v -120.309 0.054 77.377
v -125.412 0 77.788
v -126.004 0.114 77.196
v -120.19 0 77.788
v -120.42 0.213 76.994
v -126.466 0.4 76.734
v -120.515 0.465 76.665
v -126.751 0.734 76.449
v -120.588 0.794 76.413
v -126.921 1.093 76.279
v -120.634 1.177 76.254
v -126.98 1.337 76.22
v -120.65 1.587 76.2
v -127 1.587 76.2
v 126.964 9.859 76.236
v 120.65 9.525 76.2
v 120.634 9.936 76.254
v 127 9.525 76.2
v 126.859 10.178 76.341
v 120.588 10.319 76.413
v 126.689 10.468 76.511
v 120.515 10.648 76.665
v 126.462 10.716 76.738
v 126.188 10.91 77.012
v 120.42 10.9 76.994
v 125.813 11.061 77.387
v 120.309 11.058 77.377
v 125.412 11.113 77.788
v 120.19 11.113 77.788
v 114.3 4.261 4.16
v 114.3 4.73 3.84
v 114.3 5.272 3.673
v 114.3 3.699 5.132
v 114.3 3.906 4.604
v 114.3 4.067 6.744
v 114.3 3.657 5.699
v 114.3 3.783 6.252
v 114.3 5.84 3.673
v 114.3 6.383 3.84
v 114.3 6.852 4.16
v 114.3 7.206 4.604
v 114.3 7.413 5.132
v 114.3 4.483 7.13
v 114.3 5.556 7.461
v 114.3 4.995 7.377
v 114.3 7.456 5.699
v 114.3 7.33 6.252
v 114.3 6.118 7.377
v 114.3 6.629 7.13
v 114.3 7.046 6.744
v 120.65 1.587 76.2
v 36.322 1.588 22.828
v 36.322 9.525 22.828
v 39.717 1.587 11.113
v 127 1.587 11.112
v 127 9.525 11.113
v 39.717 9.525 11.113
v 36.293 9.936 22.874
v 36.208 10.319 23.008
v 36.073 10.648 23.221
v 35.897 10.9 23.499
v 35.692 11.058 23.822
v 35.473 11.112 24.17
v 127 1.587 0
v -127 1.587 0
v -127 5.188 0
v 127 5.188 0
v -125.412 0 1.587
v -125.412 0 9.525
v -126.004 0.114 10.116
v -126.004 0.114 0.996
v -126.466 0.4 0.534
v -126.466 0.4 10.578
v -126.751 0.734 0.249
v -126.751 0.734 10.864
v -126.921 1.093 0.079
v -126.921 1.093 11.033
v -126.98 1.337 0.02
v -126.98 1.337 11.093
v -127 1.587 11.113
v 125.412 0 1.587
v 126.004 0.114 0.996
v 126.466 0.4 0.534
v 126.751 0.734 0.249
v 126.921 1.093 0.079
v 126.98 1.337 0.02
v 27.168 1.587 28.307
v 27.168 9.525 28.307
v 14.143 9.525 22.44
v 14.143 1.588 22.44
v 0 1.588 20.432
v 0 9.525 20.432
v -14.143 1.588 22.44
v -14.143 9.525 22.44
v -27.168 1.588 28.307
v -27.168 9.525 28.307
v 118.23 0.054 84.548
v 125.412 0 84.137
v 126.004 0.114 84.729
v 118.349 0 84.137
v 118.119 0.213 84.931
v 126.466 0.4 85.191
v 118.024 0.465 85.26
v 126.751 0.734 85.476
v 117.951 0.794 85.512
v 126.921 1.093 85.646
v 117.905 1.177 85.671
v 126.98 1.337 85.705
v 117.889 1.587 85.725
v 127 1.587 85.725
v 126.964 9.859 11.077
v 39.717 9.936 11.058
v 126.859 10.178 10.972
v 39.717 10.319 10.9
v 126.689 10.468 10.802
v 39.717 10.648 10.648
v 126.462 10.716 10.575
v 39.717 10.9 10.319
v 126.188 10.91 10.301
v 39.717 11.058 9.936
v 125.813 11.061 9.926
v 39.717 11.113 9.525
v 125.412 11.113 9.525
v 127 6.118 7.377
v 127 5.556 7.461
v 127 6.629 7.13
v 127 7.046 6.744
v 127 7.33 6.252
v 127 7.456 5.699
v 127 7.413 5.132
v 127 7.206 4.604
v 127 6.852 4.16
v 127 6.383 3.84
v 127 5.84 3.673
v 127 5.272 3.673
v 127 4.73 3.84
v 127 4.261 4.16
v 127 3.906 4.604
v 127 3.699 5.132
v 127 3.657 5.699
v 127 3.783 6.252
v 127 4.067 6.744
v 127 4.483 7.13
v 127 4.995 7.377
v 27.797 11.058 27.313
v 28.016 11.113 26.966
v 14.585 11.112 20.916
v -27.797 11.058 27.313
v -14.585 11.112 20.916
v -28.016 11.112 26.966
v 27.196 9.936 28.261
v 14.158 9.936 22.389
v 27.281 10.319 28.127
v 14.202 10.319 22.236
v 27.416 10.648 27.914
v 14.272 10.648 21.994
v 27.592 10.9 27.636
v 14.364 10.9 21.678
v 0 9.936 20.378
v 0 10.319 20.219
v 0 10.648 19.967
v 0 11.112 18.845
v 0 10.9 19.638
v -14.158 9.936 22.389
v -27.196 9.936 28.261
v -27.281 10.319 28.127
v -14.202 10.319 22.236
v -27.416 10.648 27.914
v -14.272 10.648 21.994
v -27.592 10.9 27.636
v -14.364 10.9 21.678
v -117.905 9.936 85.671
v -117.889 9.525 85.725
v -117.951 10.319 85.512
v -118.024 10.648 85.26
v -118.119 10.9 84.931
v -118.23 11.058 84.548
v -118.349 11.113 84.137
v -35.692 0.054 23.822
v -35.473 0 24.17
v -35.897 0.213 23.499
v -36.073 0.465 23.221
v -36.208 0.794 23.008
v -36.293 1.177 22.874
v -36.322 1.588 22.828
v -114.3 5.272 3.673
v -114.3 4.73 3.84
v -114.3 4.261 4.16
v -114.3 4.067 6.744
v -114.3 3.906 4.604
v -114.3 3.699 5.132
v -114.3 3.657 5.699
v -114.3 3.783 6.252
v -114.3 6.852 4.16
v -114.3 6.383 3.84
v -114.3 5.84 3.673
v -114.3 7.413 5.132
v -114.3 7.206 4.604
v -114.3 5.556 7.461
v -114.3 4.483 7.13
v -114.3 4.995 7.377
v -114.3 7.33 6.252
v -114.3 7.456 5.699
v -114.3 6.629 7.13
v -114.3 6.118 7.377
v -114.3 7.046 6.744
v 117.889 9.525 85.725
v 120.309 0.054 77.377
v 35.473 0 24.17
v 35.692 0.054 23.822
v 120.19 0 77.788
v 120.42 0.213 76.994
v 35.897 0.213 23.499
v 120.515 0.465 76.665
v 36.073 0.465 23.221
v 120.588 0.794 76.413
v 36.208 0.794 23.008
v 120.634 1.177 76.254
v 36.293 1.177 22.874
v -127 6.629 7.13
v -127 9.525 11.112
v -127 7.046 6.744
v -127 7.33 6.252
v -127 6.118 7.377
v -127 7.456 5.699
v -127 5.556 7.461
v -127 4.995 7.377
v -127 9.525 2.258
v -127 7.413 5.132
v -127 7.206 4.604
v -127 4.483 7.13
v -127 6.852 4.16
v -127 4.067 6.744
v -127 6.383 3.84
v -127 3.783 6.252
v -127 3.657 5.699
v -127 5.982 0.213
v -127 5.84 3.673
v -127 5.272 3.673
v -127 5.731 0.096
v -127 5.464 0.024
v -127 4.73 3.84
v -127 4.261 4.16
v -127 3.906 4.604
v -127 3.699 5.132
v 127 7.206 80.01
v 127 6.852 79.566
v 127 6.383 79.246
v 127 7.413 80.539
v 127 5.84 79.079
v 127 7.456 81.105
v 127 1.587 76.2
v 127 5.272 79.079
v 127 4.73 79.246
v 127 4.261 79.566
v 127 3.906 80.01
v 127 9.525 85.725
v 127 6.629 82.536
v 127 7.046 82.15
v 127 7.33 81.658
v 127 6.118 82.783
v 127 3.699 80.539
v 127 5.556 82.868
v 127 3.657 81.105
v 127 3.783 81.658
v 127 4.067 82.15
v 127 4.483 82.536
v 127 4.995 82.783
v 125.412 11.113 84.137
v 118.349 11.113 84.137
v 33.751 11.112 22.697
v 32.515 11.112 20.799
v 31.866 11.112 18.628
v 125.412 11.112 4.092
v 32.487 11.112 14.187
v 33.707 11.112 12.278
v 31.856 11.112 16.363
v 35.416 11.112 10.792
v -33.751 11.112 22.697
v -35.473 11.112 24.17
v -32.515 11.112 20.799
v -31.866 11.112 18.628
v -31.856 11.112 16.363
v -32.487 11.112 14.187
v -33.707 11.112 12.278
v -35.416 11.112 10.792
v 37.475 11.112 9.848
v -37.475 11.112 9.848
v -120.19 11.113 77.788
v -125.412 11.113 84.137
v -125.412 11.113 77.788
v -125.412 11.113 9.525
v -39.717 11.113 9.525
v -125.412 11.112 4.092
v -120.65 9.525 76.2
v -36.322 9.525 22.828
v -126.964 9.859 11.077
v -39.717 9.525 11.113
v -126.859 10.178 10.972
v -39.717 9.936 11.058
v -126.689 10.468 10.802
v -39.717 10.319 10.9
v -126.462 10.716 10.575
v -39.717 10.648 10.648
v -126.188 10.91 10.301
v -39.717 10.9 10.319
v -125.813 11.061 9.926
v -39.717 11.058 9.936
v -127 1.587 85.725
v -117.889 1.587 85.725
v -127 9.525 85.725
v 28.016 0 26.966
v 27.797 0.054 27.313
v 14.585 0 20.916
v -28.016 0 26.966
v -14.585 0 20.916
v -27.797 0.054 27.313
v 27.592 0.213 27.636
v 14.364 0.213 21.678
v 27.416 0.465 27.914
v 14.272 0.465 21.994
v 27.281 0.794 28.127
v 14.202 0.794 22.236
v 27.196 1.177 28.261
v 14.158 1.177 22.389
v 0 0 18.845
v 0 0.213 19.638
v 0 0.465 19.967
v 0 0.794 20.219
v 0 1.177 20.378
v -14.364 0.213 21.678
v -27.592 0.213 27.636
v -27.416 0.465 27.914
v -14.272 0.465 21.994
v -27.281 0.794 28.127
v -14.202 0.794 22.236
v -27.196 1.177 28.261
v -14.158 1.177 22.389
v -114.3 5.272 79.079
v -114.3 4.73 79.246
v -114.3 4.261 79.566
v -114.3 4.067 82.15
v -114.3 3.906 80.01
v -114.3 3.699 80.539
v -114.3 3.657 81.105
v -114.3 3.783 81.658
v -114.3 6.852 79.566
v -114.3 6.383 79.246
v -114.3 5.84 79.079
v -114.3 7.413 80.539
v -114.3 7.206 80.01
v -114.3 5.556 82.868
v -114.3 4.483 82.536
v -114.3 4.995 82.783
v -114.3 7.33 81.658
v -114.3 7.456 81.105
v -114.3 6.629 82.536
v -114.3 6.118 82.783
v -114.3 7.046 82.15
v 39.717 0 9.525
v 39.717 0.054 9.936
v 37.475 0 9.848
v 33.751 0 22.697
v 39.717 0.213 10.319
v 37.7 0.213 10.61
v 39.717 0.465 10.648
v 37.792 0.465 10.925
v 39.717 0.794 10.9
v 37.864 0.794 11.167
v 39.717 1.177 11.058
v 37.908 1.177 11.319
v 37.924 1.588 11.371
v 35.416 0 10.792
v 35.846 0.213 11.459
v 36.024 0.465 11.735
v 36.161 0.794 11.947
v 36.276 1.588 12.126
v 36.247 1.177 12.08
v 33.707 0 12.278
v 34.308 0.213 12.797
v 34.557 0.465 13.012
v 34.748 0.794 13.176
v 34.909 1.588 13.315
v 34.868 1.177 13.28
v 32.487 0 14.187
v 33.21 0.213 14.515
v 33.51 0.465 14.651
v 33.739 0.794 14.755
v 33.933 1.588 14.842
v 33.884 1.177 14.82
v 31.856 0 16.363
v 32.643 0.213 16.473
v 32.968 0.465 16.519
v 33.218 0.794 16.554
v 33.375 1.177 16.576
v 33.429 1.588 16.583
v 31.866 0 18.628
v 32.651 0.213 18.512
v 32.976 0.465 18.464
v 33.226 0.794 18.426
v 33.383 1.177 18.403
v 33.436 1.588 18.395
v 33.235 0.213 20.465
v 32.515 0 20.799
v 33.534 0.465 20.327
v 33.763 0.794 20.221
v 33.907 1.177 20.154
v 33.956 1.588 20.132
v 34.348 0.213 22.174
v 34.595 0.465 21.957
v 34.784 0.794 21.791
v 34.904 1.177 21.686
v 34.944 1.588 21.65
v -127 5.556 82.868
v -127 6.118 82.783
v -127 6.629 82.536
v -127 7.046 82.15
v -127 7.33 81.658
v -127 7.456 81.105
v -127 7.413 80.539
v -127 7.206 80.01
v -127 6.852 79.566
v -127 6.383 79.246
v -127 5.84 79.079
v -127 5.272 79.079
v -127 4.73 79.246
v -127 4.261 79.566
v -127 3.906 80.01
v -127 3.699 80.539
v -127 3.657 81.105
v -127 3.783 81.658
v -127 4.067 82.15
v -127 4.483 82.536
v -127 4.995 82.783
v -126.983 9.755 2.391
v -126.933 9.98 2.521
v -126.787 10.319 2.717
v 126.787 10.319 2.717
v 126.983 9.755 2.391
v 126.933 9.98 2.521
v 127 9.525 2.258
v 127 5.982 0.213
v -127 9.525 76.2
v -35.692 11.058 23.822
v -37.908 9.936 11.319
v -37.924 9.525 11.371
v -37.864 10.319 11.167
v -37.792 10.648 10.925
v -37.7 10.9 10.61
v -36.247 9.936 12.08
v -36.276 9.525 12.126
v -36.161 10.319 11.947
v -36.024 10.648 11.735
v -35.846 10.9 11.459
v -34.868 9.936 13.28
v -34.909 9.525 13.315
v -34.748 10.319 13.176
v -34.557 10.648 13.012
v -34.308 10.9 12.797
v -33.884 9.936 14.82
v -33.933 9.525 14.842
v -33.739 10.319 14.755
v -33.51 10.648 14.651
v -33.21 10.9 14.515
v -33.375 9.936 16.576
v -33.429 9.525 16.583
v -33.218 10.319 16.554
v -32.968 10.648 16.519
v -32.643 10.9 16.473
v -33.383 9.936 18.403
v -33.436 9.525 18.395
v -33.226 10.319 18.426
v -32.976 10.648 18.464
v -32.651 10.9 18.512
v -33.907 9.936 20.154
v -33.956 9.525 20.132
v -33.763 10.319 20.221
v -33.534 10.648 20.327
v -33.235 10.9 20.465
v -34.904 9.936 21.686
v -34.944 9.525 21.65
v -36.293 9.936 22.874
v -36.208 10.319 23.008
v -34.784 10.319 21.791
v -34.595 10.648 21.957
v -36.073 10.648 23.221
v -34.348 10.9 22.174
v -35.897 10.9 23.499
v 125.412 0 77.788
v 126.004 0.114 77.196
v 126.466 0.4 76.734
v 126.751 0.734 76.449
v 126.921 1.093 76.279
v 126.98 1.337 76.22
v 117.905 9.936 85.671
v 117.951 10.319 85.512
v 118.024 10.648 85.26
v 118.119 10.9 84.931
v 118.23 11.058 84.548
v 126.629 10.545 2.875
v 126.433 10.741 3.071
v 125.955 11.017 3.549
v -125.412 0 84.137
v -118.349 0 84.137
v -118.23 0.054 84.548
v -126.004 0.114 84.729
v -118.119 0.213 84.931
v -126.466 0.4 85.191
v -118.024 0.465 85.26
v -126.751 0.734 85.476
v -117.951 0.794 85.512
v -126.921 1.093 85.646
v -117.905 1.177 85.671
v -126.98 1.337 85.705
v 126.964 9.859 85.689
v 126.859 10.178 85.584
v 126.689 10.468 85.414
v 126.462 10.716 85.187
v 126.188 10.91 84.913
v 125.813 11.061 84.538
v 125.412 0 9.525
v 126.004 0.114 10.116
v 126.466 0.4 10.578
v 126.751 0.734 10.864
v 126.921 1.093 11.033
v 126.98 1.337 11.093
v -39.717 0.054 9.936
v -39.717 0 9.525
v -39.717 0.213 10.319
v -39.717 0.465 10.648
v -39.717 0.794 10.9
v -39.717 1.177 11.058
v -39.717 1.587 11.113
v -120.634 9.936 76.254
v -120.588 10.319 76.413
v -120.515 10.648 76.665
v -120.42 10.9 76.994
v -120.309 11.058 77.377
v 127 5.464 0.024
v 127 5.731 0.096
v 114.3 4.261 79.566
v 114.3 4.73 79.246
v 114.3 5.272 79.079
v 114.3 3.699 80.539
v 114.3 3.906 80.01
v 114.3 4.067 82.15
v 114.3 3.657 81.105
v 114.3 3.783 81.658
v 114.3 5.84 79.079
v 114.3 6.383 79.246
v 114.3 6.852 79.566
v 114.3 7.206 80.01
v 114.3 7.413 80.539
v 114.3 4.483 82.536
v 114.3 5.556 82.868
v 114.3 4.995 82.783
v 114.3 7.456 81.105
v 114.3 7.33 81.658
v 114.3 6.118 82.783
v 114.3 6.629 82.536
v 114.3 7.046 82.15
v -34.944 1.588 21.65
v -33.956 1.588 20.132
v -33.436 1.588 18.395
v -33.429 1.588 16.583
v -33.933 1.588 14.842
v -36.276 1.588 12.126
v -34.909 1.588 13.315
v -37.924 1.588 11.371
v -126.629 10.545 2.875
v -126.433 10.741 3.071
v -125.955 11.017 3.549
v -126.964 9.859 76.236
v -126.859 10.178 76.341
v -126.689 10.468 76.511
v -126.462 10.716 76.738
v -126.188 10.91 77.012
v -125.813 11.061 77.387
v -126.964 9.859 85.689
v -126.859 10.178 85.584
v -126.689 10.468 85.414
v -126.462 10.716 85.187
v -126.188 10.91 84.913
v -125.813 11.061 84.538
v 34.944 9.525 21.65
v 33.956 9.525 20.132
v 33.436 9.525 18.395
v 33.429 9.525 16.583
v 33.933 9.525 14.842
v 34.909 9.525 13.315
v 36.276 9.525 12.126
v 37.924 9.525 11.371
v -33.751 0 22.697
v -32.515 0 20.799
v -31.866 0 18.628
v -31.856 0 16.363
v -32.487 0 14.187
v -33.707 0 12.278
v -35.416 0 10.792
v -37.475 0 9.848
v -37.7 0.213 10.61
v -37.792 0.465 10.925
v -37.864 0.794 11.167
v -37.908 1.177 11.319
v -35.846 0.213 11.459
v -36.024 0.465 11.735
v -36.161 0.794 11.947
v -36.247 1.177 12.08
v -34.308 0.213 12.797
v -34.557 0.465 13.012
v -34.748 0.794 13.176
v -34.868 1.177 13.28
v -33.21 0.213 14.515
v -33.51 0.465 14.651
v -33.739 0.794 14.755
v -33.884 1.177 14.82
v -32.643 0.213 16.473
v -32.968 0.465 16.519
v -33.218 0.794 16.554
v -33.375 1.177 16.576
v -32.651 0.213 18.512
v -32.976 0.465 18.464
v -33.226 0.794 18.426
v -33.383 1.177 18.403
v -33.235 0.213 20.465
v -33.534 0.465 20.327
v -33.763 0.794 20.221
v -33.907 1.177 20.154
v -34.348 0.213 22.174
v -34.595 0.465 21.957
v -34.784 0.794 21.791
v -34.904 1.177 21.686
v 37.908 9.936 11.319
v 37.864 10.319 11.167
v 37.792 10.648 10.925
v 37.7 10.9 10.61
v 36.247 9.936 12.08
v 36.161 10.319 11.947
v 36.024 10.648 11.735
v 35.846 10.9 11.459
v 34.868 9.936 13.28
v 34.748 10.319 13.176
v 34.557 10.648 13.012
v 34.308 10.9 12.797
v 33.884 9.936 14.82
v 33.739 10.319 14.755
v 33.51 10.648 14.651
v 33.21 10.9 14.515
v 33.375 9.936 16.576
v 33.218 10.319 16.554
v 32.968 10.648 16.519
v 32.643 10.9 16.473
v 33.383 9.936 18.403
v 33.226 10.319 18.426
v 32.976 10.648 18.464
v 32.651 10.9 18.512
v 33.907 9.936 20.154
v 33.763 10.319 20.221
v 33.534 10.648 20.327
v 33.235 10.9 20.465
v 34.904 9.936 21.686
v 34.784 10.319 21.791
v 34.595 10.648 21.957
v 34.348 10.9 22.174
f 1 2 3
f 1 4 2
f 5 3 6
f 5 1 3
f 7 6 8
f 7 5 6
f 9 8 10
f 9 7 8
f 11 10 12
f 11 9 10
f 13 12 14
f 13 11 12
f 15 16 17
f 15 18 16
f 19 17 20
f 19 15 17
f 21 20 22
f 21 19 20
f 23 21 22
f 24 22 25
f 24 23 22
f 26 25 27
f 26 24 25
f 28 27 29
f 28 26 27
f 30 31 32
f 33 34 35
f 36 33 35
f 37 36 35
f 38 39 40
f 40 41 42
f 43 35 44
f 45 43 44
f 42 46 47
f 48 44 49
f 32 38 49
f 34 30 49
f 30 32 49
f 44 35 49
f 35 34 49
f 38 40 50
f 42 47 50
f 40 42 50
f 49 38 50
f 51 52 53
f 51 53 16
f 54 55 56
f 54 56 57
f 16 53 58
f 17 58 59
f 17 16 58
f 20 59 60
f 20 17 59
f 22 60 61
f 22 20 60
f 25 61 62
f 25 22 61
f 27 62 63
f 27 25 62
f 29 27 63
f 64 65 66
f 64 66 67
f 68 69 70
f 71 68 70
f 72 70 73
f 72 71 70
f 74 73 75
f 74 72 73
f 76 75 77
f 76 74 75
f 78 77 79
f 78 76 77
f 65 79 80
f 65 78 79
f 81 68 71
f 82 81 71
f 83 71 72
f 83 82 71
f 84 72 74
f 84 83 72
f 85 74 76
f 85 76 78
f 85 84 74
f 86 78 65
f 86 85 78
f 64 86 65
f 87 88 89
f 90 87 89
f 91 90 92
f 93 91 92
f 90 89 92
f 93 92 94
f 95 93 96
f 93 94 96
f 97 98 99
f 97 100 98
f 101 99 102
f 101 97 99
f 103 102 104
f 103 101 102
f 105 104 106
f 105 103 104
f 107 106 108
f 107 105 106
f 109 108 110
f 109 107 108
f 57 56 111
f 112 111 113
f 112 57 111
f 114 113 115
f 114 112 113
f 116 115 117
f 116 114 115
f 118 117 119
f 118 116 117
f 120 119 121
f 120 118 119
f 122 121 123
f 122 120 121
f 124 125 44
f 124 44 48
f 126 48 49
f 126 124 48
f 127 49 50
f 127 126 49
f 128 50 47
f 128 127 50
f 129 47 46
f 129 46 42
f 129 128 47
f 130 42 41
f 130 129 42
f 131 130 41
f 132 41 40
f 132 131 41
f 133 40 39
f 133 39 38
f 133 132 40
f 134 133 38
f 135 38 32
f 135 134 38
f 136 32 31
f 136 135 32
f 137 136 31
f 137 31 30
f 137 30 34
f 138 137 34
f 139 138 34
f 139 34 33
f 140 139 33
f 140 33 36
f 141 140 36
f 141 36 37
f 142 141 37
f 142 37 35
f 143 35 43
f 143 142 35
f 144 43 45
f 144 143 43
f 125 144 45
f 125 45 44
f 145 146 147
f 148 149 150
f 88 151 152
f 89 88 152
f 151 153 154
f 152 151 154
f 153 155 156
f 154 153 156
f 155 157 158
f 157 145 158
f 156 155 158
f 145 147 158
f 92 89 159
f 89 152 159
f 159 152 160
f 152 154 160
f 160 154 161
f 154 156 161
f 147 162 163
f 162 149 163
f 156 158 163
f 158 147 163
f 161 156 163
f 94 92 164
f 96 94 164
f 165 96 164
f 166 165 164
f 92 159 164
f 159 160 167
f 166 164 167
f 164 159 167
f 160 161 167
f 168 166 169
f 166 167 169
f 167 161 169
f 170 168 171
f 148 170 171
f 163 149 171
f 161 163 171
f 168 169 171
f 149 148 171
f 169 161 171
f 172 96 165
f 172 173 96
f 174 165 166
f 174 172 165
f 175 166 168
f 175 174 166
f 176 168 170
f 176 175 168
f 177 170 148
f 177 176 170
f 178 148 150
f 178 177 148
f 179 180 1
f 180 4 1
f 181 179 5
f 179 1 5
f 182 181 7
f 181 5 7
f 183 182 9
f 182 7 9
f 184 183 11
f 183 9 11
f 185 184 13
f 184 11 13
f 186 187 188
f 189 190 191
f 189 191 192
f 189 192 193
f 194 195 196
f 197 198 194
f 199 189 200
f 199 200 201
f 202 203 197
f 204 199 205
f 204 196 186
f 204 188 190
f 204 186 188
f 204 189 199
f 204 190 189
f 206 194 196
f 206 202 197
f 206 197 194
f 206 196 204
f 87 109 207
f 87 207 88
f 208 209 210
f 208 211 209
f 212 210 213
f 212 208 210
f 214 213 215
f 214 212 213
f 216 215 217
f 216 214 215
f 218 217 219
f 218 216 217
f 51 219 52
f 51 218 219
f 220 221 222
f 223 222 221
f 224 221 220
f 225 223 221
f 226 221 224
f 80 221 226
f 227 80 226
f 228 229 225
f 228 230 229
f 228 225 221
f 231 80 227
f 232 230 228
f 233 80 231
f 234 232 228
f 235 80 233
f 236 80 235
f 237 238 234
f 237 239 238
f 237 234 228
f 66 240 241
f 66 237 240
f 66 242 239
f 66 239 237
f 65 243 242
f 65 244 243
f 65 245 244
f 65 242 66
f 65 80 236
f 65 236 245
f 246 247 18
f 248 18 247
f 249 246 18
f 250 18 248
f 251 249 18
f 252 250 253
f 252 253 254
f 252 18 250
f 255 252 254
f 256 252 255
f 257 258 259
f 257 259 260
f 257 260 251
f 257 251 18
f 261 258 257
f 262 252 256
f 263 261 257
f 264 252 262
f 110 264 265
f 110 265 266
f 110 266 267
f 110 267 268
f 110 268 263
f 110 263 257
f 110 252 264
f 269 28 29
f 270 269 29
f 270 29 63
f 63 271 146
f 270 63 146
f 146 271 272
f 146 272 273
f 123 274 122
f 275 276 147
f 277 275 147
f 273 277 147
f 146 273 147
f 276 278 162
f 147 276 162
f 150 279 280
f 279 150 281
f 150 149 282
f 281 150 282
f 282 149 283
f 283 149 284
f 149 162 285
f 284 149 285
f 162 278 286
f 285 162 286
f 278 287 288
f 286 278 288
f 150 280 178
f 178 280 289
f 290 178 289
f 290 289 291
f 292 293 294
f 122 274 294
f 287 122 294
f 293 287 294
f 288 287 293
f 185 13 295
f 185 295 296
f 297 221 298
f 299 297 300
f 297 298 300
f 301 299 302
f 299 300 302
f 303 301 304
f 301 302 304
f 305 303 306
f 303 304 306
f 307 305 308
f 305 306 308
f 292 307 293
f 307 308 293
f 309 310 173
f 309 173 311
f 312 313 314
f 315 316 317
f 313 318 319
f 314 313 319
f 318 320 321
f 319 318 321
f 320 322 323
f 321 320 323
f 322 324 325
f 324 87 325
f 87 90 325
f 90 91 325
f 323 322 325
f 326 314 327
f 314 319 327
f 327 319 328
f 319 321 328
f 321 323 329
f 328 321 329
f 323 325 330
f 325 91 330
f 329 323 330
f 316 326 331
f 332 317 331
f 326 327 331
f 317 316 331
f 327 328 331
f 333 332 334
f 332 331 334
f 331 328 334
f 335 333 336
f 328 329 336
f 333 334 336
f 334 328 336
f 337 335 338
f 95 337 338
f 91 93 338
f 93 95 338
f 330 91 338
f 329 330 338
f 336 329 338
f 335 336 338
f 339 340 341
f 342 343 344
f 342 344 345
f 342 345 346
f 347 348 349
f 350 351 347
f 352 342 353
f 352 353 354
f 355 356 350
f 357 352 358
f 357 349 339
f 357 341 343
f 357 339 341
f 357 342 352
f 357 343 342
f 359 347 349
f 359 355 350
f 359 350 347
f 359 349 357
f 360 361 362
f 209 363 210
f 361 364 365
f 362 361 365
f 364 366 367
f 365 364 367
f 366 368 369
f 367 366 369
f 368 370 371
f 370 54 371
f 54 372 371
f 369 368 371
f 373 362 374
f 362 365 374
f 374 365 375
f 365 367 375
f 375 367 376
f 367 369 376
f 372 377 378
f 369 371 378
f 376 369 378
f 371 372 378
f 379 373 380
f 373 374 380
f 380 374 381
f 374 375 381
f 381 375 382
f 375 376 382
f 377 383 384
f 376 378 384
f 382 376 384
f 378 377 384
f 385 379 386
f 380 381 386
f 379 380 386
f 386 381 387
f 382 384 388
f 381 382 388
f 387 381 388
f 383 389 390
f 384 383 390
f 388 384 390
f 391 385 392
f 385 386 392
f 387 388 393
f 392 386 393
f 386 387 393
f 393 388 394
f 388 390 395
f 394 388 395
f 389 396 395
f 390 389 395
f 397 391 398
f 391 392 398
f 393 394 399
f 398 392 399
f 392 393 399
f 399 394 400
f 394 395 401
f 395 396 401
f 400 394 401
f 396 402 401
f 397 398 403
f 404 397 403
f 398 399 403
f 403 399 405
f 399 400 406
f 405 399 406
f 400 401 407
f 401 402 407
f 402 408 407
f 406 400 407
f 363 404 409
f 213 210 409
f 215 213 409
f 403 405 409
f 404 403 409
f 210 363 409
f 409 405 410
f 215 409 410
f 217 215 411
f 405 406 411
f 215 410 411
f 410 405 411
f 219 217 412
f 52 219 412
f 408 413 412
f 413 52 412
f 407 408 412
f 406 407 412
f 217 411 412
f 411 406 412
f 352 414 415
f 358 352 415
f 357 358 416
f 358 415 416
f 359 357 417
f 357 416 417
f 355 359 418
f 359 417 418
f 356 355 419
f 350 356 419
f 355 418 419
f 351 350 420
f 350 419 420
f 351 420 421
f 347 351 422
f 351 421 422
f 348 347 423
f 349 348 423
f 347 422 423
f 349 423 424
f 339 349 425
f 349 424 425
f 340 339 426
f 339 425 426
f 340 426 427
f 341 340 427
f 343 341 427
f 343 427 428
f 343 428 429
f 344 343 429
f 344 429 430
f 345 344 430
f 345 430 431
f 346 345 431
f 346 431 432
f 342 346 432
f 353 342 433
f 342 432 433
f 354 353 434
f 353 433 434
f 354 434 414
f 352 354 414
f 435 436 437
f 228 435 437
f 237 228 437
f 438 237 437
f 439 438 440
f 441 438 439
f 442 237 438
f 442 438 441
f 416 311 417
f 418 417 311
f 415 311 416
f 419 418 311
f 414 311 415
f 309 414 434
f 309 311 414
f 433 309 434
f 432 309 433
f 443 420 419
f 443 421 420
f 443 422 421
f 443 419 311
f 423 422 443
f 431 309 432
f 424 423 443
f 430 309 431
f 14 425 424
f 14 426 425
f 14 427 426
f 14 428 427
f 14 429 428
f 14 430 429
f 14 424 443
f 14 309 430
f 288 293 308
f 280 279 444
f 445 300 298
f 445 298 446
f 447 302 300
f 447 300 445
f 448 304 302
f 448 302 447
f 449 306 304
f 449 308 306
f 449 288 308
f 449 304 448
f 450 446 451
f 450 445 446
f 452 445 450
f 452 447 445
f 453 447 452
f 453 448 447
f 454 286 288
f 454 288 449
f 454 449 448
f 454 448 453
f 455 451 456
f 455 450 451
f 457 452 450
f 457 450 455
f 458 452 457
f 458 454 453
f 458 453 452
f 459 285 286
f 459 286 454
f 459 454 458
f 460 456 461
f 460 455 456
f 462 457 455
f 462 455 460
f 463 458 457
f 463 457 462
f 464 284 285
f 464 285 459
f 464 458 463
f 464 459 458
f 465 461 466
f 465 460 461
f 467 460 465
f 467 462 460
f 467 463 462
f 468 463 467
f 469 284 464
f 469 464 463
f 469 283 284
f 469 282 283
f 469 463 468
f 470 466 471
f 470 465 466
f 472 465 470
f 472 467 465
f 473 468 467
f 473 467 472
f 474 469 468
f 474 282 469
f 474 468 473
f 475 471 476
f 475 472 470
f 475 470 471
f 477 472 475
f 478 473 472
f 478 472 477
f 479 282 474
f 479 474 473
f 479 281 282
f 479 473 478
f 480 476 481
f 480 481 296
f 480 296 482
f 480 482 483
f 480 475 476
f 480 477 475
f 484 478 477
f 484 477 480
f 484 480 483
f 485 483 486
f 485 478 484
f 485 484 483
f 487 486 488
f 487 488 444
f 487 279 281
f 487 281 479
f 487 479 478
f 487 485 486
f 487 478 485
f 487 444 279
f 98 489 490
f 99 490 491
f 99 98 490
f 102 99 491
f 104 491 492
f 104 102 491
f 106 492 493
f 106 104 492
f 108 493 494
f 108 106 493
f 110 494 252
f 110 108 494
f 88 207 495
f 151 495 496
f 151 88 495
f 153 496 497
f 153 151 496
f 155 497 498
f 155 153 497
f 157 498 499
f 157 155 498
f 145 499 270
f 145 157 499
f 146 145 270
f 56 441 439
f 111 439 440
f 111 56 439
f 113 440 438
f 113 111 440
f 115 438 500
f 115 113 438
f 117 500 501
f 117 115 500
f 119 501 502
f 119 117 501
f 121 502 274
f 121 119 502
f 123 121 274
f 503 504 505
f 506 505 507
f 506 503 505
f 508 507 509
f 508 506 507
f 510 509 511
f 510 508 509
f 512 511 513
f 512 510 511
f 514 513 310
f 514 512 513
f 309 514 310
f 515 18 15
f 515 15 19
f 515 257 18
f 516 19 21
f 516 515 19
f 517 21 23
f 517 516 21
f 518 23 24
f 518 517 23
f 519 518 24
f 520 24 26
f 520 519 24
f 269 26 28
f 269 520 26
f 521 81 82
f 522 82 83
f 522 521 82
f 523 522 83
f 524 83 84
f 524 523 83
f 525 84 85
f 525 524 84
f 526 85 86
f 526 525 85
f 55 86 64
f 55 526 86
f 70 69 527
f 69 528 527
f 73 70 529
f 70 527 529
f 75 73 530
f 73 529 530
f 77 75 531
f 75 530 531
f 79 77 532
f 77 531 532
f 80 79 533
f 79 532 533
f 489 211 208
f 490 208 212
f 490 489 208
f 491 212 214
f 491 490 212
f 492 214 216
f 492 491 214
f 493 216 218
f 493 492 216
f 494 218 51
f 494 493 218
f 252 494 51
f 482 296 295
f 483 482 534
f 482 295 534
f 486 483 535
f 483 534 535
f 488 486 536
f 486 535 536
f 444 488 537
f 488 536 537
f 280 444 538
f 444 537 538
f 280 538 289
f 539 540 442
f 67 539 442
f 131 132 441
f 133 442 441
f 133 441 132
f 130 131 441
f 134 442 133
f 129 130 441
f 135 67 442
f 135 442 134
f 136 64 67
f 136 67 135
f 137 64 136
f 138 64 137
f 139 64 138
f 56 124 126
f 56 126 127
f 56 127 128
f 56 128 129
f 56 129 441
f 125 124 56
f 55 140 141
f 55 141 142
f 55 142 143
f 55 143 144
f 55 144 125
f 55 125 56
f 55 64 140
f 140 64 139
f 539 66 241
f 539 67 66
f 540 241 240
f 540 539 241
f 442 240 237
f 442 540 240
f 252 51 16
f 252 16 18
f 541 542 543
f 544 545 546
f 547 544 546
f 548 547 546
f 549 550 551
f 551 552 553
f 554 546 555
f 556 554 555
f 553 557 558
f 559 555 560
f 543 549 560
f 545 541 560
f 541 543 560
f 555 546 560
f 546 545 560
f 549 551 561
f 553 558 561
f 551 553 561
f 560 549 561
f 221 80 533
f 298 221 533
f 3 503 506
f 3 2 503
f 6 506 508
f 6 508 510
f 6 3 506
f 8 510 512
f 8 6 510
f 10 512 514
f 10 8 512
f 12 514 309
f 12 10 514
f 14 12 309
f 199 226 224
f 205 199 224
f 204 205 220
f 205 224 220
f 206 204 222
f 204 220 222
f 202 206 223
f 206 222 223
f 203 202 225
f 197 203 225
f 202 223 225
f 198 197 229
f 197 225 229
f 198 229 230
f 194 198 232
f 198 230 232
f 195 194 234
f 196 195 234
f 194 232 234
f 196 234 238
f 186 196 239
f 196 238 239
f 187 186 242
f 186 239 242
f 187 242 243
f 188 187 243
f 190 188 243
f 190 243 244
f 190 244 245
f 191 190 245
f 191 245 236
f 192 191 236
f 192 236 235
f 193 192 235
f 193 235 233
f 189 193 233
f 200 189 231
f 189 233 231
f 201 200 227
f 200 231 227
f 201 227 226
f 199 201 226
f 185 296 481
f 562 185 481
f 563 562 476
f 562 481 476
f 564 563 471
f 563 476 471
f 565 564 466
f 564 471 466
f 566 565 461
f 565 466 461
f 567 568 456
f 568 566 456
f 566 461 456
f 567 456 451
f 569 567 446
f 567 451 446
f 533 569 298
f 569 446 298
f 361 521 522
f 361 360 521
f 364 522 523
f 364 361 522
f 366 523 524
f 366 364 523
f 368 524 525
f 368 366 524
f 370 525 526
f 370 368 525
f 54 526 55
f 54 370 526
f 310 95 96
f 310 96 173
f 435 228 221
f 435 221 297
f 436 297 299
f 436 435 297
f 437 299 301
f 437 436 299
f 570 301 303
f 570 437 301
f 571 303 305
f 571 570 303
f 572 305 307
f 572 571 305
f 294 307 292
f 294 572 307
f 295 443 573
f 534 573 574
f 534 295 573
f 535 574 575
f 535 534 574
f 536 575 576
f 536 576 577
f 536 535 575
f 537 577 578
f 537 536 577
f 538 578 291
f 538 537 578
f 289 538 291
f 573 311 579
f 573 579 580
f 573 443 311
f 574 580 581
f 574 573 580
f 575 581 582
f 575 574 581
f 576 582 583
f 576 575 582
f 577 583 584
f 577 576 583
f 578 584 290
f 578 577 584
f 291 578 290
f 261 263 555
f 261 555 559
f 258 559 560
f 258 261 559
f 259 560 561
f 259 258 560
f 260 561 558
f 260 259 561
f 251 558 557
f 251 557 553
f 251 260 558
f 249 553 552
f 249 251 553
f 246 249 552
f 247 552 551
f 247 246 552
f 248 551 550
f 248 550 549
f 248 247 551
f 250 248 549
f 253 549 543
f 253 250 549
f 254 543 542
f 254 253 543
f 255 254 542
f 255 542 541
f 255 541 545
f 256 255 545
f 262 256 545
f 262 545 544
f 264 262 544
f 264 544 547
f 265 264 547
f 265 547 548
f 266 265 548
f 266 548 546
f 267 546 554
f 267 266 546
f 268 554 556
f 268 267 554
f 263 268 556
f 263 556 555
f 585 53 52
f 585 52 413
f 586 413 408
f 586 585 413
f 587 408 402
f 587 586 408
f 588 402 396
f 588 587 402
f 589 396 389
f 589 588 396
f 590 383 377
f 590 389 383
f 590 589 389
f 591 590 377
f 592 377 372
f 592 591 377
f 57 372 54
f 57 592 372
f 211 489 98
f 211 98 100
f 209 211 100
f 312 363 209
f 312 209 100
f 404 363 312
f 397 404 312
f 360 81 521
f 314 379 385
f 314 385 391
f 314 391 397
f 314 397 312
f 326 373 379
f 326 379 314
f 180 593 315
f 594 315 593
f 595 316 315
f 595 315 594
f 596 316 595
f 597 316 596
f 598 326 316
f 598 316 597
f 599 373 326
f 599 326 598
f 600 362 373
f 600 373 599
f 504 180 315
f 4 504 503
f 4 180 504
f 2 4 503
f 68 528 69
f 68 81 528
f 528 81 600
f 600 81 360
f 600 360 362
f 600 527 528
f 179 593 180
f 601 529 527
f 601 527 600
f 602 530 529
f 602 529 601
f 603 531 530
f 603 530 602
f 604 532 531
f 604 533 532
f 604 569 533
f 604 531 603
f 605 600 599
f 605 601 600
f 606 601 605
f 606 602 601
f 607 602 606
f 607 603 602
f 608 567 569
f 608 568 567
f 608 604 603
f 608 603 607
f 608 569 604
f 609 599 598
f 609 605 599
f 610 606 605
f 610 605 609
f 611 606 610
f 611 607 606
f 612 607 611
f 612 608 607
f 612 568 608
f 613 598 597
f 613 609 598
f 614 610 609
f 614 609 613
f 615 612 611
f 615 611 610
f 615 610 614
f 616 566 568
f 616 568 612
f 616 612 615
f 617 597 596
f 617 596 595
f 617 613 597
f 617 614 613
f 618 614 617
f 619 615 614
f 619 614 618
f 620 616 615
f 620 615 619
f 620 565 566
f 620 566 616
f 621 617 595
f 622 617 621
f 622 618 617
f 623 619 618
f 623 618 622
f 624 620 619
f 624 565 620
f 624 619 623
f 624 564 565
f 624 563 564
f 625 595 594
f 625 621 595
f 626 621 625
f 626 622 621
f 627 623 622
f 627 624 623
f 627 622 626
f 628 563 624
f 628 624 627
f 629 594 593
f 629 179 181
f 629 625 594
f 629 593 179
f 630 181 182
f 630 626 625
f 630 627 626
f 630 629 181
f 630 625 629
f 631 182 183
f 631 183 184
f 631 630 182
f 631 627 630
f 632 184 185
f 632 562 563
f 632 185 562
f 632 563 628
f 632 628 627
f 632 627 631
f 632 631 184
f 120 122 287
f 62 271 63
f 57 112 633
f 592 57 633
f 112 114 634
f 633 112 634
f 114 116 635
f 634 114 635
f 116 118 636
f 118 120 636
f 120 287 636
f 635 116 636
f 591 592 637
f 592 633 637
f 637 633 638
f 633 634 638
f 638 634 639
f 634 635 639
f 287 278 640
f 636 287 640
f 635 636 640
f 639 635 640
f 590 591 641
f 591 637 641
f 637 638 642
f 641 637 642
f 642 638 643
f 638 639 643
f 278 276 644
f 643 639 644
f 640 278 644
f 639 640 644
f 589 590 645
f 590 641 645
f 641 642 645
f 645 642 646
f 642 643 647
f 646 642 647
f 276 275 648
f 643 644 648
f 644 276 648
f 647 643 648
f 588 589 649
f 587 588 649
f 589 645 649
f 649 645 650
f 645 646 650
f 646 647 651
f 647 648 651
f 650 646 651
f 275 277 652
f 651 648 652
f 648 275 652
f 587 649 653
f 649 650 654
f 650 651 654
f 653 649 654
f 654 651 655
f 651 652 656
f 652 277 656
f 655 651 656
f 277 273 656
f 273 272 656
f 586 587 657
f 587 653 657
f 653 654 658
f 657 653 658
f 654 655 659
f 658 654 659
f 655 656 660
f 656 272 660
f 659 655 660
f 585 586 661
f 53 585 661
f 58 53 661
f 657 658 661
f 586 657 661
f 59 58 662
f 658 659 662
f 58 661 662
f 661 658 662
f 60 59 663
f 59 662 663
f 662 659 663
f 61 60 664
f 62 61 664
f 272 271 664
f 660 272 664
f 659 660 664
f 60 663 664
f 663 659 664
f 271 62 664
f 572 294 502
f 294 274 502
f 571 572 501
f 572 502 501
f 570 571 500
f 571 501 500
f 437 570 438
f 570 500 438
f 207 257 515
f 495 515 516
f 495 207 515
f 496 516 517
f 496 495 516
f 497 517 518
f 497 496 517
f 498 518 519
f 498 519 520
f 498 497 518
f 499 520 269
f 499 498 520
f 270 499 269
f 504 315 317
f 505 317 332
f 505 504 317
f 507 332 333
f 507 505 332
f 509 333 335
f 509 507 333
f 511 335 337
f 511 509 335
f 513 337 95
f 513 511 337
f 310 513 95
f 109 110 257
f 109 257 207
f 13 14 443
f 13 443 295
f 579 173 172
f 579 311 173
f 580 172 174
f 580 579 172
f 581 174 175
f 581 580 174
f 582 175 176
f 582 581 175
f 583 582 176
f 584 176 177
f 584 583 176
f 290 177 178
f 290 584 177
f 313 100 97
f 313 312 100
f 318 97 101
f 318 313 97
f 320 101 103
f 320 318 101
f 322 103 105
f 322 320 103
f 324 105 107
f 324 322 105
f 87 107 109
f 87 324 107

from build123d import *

# Parameters (mm, degrees)
BOSS_EXTRUDE1_DEPTH = 11.1125
CHAMFER1_SIZE       = 3.175
CHAMFER1_SIZE2      = 5.499261314
FILLET1_R           = 50.8
FILLET2_R           = 6.35
SKETCH2_R           = 1.905
CUT_EXTRUDE1_DEPTH  = 12.7
FILLET4_R           = 1.5875


with BuildPart() as part:
    # Sketch1 → Boss-Extrude1 (new body)
    with BuildSketch(Plane(origin=(0, 0, 0), x_dir=(1, 0, 0), z_dir=(0, 1, 0))):
        Polygon((-127, 0), (127, 0), (127, -11.1125), (17.810616698, -11.1125), (120.65, -76.2), (127, -76.2), (127, -85.725), (117.889049151, -85.725), (0, -11.1125), (-117.889049151, -85.725), (-127, -85.725), (-127, -76.2), (-120.65, -76.2), (-17.810616698, -11.1125), (-55.527449944, -11.1125), (-127, -11.1125), align=None)
    extrude(amount=BOSS_EXTRUDE1_DEPTH)

    # Chamfer1
    chamfer1_edges = [part.edges().sort_by_distance(p)[0] for p in [
        (0, 11.1125, 0),
    ]]
    chamfer1_side = [part.faces().sort_by_distance(p)[0] for p in [
        (0, 11.1125, 2.680760631),
    ]]
    chamfer(chamfer1_edges, length=CHAMFER1_SIZE, length2=CHAMFER1_SIZE2, reference=chamfer1_side[0])

    # Fillet1
    fillet1_edges = [part.edges().sort_by_distance(p)[0] for p in [
        (0, 5.55625, 11.1125),
    ]]
    fillet(fillet1_edges, radius=FILLET1_R)

    # Fillet2
    fillet2_edges = [part.edges().sort_by_distance(p)[0] for p in [
        (-17.810616698, 5.55625, 11.1125),
        (17.810616698, 5.55625, 11.1125),
    ]]
    fillet(fillet2_edges, radius=FILLET2_R)

    # Sketch2 → Cut-Extrude1 (cut)
    with BuildSketch(Plane.ZY.offset(127)):
        with Locations((5.55625, 5.55625)):
            Circle(SKETCH2_R)
        with Locations((80.9625, 5.55625)):
            Circle(SKETCH2_R)
    cut_extrude1 = extrude(amount=-CUT_EXTRUDE1_DEPTH, mode=Mode.SUBTRACT)

    # Mirror1: Cut-Extrude1 across plane
    add(cut_extrude1.mirror(Plane(origin=(0, 0, 0), x_dir=(0, 0, 1), z_dir=(1, 0, 0))), mode=Mode.SUBTRACT)

    # Fillet4
    fillet4_edges = [part.edges().sort_by_distance(p)[0] for p in [
        (-127, 11.1125, 80.9625),
        (-83.358735865, 0, 11.1125),
        (-127, 0, 5.55625),
        (-122.444524575, 11.1125, 85.725),
        (0, 0, 0),
        (127, 0, 5.55625),
        (78.485766866, 0, 49.514070583),
        (123.825, 0, 76.2),
        (127, 0, 80.9625),
        (122.444524575, 0, 85.725),
        (-72.528276565, 0, 57.015966642),
        (-122.444524575, 0, 85.725),
        (-72.528276565, 11.1125, 57.015966642),
        (-127, 0, 80.9625),
        (-123.825, 0, 76.2),
        (122.444524575, 11.1125, 85.725),
        (127, 11.1125, 80.9625),
        (123.825, 11.1125, 76.2),
        (78.485766866, 11.1125, 49.514070583),
        (-127, 11.1125, 7.14375),
        (0, 11.1125, 3.175),
        (127, 11.1125, 7.14375),
        (0, 5.613238686, 0),
        (72.528276565, 0, 57.015966642),
        (72.528276565, 11.1125, 57.015966642),
        (0, 0, 20.43206261),
        (0, 11.1125, 20.43206261),
        (-83.358735865, 11.1125, 11.1125),
        (83.358735865, 0, 11.1125),
        (83.358735865, 11.1125, 11.1125),
        (-78.485766866, 0, 49.514070583),
        (-78.485766866, 11.1125, 49.514070583),
        (33.618524222, 0, 15.694637081),
        (33.618524222, 11.1125, 15.694637081),
        (-33.618524222, 0, 15.694637081),
        (-33.618524222, 11.1125, 15.694637081),
        (-123.825, 11.1125, 76.2),
    ]]
    fillet(fillet4_edges, radius=FILLET4_R)


solid = part.part
